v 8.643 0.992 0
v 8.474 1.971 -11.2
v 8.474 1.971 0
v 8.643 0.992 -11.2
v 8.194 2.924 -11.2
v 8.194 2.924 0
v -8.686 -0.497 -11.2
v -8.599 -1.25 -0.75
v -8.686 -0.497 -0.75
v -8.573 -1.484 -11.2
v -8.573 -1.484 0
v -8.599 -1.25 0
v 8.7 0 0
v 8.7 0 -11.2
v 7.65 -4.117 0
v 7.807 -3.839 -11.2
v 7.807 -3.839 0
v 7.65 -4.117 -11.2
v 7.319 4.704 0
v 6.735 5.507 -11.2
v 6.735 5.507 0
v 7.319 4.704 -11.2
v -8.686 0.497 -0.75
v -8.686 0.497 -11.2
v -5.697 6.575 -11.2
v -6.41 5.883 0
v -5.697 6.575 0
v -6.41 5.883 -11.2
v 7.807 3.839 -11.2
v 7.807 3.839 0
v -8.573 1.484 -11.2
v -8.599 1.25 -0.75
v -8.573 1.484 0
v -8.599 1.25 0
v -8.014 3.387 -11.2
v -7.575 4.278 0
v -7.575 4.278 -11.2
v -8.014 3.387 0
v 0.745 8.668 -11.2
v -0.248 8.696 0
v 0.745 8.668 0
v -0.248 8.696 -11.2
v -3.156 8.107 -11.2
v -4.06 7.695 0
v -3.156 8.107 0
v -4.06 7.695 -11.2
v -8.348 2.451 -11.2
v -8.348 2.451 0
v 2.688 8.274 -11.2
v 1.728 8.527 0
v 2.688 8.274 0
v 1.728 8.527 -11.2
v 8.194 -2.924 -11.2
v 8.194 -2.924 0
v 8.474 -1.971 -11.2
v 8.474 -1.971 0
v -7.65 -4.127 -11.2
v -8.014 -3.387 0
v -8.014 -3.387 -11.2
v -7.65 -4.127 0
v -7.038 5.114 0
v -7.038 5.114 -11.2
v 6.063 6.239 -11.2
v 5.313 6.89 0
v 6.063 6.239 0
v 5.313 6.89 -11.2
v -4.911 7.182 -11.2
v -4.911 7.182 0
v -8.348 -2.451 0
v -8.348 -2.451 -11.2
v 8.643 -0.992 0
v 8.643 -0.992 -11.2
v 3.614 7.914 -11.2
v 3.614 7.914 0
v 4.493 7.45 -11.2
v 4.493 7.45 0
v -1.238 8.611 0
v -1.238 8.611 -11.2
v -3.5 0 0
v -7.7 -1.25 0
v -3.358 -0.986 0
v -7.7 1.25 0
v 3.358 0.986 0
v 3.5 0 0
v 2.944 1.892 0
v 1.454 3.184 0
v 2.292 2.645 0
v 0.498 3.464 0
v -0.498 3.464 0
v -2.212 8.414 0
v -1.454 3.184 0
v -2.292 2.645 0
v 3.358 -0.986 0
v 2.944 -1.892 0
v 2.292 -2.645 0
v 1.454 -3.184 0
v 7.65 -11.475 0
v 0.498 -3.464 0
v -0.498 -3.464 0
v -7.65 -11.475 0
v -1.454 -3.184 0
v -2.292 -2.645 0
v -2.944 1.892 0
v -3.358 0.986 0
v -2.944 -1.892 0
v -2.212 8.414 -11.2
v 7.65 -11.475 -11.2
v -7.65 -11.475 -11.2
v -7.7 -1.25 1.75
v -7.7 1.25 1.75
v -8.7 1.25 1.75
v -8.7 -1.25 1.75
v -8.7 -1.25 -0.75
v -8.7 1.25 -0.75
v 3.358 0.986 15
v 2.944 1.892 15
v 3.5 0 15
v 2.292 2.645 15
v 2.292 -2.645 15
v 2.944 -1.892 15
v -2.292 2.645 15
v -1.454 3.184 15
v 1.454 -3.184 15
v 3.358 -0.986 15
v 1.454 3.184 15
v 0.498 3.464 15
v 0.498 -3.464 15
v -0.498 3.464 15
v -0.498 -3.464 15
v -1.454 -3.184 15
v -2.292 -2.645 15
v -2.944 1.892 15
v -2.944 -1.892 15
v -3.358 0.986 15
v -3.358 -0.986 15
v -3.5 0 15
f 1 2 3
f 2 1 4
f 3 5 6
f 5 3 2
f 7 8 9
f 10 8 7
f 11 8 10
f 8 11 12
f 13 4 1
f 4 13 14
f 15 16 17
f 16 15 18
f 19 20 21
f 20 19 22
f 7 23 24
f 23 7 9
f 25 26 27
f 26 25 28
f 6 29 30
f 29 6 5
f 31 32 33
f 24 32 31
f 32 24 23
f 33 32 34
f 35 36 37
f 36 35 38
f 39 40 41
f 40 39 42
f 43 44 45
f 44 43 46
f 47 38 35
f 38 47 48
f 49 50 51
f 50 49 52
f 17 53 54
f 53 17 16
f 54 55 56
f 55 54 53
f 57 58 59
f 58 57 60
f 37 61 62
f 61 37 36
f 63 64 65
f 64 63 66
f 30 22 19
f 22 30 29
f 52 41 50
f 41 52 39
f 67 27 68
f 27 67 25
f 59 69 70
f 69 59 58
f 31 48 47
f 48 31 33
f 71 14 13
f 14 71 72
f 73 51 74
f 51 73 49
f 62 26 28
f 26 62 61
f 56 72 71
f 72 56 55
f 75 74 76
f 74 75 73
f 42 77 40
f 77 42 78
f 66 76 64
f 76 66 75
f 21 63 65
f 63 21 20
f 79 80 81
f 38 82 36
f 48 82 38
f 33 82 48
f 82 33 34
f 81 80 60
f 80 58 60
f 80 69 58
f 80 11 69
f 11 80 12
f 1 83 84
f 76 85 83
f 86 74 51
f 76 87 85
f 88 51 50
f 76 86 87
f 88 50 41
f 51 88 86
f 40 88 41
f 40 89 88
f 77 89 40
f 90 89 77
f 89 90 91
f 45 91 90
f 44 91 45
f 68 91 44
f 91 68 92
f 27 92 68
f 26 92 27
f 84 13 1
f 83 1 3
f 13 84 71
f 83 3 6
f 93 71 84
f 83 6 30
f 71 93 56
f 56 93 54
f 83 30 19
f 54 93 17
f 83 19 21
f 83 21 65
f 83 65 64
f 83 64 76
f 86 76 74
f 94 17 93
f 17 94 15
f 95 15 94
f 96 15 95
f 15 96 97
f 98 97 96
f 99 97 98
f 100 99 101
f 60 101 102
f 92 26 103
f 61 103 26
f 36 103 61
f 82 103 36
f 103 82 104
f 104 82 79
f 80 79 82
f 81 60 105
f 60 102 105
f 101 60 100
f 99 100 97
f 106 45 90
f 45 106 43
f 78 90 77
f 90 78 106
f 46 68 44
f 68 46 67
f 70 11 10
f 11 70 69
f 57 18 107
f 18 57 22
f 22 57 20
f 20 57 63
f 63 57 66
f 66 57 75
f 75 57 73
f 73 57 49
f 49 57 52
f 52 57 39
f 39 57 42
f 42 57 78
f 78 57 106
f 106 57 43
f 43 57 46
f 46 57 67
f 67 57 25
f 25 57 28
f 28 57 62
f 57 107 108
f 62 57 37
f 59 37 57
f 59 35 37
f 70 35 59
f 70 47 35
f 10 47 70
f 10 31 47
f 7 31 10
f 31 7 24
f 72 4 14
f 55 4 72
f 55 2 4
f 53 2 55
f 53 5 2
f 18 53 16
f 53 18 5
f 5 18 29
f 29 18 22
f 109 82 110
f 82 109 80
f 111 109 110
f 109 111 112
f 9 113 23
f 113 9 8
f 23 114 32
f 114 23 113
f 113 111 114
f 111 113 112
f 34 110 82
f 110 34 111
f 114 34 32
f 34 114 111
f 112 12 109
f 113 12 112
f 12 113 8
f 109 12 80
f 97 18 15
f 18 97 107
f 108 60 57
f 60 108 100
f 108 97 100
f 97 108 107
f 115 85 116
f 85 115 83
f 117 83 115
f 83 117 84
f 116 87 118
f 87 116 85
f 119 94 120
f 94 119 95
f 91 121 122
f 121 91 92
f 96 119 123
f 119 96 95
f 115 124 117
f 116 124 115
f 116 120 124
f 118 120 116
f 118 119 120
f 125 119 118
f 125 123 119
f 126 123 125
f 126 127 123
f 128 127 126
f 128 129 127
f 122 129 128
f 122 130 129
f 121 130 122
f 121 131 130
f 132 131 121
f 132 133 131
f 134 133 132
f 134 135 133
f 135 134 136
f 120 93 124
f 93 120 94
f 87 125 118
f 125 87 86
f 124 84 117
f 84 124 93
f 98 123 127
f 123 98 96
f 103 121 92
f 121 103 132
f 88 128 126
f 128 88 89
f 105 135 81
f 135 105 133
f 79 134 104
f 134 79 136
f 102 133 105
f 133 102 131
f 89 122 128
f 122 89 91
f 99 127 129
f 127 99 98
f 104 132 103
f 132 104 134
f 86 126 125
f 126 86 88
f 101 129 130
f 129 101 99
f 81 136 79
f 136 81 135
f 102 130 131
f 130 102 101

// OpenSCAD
base_radius = 17.4/2;
base_width = 15.3;
thickness = 11.2;
pin_sides = 2.5;
pin_thickness = 1;
shaft_radius= 7/2;
shaft_height=15;
thread_height=6.5;

$fs=1;
$fa=0.4;
module switch_pot() {
    translate([0, 0, -thickness/2])
        cylinder(h=thickness, r=base_radius, center=true);
    translate([-base_radius+pin_thickness/2, 0, pin_thickness/2])
        cube([pin_thickness, pin_sides, pin_sides], center=true);
    translate([0, -base_width/2, -thickness/2])
        cube([base_width, base_width/2, thickness], center=true);
    translate([0, 0, shaft_height/2])
        cylinder(h=shaft_height, r=shaft_radius, center=true);
}

switch_pot();
